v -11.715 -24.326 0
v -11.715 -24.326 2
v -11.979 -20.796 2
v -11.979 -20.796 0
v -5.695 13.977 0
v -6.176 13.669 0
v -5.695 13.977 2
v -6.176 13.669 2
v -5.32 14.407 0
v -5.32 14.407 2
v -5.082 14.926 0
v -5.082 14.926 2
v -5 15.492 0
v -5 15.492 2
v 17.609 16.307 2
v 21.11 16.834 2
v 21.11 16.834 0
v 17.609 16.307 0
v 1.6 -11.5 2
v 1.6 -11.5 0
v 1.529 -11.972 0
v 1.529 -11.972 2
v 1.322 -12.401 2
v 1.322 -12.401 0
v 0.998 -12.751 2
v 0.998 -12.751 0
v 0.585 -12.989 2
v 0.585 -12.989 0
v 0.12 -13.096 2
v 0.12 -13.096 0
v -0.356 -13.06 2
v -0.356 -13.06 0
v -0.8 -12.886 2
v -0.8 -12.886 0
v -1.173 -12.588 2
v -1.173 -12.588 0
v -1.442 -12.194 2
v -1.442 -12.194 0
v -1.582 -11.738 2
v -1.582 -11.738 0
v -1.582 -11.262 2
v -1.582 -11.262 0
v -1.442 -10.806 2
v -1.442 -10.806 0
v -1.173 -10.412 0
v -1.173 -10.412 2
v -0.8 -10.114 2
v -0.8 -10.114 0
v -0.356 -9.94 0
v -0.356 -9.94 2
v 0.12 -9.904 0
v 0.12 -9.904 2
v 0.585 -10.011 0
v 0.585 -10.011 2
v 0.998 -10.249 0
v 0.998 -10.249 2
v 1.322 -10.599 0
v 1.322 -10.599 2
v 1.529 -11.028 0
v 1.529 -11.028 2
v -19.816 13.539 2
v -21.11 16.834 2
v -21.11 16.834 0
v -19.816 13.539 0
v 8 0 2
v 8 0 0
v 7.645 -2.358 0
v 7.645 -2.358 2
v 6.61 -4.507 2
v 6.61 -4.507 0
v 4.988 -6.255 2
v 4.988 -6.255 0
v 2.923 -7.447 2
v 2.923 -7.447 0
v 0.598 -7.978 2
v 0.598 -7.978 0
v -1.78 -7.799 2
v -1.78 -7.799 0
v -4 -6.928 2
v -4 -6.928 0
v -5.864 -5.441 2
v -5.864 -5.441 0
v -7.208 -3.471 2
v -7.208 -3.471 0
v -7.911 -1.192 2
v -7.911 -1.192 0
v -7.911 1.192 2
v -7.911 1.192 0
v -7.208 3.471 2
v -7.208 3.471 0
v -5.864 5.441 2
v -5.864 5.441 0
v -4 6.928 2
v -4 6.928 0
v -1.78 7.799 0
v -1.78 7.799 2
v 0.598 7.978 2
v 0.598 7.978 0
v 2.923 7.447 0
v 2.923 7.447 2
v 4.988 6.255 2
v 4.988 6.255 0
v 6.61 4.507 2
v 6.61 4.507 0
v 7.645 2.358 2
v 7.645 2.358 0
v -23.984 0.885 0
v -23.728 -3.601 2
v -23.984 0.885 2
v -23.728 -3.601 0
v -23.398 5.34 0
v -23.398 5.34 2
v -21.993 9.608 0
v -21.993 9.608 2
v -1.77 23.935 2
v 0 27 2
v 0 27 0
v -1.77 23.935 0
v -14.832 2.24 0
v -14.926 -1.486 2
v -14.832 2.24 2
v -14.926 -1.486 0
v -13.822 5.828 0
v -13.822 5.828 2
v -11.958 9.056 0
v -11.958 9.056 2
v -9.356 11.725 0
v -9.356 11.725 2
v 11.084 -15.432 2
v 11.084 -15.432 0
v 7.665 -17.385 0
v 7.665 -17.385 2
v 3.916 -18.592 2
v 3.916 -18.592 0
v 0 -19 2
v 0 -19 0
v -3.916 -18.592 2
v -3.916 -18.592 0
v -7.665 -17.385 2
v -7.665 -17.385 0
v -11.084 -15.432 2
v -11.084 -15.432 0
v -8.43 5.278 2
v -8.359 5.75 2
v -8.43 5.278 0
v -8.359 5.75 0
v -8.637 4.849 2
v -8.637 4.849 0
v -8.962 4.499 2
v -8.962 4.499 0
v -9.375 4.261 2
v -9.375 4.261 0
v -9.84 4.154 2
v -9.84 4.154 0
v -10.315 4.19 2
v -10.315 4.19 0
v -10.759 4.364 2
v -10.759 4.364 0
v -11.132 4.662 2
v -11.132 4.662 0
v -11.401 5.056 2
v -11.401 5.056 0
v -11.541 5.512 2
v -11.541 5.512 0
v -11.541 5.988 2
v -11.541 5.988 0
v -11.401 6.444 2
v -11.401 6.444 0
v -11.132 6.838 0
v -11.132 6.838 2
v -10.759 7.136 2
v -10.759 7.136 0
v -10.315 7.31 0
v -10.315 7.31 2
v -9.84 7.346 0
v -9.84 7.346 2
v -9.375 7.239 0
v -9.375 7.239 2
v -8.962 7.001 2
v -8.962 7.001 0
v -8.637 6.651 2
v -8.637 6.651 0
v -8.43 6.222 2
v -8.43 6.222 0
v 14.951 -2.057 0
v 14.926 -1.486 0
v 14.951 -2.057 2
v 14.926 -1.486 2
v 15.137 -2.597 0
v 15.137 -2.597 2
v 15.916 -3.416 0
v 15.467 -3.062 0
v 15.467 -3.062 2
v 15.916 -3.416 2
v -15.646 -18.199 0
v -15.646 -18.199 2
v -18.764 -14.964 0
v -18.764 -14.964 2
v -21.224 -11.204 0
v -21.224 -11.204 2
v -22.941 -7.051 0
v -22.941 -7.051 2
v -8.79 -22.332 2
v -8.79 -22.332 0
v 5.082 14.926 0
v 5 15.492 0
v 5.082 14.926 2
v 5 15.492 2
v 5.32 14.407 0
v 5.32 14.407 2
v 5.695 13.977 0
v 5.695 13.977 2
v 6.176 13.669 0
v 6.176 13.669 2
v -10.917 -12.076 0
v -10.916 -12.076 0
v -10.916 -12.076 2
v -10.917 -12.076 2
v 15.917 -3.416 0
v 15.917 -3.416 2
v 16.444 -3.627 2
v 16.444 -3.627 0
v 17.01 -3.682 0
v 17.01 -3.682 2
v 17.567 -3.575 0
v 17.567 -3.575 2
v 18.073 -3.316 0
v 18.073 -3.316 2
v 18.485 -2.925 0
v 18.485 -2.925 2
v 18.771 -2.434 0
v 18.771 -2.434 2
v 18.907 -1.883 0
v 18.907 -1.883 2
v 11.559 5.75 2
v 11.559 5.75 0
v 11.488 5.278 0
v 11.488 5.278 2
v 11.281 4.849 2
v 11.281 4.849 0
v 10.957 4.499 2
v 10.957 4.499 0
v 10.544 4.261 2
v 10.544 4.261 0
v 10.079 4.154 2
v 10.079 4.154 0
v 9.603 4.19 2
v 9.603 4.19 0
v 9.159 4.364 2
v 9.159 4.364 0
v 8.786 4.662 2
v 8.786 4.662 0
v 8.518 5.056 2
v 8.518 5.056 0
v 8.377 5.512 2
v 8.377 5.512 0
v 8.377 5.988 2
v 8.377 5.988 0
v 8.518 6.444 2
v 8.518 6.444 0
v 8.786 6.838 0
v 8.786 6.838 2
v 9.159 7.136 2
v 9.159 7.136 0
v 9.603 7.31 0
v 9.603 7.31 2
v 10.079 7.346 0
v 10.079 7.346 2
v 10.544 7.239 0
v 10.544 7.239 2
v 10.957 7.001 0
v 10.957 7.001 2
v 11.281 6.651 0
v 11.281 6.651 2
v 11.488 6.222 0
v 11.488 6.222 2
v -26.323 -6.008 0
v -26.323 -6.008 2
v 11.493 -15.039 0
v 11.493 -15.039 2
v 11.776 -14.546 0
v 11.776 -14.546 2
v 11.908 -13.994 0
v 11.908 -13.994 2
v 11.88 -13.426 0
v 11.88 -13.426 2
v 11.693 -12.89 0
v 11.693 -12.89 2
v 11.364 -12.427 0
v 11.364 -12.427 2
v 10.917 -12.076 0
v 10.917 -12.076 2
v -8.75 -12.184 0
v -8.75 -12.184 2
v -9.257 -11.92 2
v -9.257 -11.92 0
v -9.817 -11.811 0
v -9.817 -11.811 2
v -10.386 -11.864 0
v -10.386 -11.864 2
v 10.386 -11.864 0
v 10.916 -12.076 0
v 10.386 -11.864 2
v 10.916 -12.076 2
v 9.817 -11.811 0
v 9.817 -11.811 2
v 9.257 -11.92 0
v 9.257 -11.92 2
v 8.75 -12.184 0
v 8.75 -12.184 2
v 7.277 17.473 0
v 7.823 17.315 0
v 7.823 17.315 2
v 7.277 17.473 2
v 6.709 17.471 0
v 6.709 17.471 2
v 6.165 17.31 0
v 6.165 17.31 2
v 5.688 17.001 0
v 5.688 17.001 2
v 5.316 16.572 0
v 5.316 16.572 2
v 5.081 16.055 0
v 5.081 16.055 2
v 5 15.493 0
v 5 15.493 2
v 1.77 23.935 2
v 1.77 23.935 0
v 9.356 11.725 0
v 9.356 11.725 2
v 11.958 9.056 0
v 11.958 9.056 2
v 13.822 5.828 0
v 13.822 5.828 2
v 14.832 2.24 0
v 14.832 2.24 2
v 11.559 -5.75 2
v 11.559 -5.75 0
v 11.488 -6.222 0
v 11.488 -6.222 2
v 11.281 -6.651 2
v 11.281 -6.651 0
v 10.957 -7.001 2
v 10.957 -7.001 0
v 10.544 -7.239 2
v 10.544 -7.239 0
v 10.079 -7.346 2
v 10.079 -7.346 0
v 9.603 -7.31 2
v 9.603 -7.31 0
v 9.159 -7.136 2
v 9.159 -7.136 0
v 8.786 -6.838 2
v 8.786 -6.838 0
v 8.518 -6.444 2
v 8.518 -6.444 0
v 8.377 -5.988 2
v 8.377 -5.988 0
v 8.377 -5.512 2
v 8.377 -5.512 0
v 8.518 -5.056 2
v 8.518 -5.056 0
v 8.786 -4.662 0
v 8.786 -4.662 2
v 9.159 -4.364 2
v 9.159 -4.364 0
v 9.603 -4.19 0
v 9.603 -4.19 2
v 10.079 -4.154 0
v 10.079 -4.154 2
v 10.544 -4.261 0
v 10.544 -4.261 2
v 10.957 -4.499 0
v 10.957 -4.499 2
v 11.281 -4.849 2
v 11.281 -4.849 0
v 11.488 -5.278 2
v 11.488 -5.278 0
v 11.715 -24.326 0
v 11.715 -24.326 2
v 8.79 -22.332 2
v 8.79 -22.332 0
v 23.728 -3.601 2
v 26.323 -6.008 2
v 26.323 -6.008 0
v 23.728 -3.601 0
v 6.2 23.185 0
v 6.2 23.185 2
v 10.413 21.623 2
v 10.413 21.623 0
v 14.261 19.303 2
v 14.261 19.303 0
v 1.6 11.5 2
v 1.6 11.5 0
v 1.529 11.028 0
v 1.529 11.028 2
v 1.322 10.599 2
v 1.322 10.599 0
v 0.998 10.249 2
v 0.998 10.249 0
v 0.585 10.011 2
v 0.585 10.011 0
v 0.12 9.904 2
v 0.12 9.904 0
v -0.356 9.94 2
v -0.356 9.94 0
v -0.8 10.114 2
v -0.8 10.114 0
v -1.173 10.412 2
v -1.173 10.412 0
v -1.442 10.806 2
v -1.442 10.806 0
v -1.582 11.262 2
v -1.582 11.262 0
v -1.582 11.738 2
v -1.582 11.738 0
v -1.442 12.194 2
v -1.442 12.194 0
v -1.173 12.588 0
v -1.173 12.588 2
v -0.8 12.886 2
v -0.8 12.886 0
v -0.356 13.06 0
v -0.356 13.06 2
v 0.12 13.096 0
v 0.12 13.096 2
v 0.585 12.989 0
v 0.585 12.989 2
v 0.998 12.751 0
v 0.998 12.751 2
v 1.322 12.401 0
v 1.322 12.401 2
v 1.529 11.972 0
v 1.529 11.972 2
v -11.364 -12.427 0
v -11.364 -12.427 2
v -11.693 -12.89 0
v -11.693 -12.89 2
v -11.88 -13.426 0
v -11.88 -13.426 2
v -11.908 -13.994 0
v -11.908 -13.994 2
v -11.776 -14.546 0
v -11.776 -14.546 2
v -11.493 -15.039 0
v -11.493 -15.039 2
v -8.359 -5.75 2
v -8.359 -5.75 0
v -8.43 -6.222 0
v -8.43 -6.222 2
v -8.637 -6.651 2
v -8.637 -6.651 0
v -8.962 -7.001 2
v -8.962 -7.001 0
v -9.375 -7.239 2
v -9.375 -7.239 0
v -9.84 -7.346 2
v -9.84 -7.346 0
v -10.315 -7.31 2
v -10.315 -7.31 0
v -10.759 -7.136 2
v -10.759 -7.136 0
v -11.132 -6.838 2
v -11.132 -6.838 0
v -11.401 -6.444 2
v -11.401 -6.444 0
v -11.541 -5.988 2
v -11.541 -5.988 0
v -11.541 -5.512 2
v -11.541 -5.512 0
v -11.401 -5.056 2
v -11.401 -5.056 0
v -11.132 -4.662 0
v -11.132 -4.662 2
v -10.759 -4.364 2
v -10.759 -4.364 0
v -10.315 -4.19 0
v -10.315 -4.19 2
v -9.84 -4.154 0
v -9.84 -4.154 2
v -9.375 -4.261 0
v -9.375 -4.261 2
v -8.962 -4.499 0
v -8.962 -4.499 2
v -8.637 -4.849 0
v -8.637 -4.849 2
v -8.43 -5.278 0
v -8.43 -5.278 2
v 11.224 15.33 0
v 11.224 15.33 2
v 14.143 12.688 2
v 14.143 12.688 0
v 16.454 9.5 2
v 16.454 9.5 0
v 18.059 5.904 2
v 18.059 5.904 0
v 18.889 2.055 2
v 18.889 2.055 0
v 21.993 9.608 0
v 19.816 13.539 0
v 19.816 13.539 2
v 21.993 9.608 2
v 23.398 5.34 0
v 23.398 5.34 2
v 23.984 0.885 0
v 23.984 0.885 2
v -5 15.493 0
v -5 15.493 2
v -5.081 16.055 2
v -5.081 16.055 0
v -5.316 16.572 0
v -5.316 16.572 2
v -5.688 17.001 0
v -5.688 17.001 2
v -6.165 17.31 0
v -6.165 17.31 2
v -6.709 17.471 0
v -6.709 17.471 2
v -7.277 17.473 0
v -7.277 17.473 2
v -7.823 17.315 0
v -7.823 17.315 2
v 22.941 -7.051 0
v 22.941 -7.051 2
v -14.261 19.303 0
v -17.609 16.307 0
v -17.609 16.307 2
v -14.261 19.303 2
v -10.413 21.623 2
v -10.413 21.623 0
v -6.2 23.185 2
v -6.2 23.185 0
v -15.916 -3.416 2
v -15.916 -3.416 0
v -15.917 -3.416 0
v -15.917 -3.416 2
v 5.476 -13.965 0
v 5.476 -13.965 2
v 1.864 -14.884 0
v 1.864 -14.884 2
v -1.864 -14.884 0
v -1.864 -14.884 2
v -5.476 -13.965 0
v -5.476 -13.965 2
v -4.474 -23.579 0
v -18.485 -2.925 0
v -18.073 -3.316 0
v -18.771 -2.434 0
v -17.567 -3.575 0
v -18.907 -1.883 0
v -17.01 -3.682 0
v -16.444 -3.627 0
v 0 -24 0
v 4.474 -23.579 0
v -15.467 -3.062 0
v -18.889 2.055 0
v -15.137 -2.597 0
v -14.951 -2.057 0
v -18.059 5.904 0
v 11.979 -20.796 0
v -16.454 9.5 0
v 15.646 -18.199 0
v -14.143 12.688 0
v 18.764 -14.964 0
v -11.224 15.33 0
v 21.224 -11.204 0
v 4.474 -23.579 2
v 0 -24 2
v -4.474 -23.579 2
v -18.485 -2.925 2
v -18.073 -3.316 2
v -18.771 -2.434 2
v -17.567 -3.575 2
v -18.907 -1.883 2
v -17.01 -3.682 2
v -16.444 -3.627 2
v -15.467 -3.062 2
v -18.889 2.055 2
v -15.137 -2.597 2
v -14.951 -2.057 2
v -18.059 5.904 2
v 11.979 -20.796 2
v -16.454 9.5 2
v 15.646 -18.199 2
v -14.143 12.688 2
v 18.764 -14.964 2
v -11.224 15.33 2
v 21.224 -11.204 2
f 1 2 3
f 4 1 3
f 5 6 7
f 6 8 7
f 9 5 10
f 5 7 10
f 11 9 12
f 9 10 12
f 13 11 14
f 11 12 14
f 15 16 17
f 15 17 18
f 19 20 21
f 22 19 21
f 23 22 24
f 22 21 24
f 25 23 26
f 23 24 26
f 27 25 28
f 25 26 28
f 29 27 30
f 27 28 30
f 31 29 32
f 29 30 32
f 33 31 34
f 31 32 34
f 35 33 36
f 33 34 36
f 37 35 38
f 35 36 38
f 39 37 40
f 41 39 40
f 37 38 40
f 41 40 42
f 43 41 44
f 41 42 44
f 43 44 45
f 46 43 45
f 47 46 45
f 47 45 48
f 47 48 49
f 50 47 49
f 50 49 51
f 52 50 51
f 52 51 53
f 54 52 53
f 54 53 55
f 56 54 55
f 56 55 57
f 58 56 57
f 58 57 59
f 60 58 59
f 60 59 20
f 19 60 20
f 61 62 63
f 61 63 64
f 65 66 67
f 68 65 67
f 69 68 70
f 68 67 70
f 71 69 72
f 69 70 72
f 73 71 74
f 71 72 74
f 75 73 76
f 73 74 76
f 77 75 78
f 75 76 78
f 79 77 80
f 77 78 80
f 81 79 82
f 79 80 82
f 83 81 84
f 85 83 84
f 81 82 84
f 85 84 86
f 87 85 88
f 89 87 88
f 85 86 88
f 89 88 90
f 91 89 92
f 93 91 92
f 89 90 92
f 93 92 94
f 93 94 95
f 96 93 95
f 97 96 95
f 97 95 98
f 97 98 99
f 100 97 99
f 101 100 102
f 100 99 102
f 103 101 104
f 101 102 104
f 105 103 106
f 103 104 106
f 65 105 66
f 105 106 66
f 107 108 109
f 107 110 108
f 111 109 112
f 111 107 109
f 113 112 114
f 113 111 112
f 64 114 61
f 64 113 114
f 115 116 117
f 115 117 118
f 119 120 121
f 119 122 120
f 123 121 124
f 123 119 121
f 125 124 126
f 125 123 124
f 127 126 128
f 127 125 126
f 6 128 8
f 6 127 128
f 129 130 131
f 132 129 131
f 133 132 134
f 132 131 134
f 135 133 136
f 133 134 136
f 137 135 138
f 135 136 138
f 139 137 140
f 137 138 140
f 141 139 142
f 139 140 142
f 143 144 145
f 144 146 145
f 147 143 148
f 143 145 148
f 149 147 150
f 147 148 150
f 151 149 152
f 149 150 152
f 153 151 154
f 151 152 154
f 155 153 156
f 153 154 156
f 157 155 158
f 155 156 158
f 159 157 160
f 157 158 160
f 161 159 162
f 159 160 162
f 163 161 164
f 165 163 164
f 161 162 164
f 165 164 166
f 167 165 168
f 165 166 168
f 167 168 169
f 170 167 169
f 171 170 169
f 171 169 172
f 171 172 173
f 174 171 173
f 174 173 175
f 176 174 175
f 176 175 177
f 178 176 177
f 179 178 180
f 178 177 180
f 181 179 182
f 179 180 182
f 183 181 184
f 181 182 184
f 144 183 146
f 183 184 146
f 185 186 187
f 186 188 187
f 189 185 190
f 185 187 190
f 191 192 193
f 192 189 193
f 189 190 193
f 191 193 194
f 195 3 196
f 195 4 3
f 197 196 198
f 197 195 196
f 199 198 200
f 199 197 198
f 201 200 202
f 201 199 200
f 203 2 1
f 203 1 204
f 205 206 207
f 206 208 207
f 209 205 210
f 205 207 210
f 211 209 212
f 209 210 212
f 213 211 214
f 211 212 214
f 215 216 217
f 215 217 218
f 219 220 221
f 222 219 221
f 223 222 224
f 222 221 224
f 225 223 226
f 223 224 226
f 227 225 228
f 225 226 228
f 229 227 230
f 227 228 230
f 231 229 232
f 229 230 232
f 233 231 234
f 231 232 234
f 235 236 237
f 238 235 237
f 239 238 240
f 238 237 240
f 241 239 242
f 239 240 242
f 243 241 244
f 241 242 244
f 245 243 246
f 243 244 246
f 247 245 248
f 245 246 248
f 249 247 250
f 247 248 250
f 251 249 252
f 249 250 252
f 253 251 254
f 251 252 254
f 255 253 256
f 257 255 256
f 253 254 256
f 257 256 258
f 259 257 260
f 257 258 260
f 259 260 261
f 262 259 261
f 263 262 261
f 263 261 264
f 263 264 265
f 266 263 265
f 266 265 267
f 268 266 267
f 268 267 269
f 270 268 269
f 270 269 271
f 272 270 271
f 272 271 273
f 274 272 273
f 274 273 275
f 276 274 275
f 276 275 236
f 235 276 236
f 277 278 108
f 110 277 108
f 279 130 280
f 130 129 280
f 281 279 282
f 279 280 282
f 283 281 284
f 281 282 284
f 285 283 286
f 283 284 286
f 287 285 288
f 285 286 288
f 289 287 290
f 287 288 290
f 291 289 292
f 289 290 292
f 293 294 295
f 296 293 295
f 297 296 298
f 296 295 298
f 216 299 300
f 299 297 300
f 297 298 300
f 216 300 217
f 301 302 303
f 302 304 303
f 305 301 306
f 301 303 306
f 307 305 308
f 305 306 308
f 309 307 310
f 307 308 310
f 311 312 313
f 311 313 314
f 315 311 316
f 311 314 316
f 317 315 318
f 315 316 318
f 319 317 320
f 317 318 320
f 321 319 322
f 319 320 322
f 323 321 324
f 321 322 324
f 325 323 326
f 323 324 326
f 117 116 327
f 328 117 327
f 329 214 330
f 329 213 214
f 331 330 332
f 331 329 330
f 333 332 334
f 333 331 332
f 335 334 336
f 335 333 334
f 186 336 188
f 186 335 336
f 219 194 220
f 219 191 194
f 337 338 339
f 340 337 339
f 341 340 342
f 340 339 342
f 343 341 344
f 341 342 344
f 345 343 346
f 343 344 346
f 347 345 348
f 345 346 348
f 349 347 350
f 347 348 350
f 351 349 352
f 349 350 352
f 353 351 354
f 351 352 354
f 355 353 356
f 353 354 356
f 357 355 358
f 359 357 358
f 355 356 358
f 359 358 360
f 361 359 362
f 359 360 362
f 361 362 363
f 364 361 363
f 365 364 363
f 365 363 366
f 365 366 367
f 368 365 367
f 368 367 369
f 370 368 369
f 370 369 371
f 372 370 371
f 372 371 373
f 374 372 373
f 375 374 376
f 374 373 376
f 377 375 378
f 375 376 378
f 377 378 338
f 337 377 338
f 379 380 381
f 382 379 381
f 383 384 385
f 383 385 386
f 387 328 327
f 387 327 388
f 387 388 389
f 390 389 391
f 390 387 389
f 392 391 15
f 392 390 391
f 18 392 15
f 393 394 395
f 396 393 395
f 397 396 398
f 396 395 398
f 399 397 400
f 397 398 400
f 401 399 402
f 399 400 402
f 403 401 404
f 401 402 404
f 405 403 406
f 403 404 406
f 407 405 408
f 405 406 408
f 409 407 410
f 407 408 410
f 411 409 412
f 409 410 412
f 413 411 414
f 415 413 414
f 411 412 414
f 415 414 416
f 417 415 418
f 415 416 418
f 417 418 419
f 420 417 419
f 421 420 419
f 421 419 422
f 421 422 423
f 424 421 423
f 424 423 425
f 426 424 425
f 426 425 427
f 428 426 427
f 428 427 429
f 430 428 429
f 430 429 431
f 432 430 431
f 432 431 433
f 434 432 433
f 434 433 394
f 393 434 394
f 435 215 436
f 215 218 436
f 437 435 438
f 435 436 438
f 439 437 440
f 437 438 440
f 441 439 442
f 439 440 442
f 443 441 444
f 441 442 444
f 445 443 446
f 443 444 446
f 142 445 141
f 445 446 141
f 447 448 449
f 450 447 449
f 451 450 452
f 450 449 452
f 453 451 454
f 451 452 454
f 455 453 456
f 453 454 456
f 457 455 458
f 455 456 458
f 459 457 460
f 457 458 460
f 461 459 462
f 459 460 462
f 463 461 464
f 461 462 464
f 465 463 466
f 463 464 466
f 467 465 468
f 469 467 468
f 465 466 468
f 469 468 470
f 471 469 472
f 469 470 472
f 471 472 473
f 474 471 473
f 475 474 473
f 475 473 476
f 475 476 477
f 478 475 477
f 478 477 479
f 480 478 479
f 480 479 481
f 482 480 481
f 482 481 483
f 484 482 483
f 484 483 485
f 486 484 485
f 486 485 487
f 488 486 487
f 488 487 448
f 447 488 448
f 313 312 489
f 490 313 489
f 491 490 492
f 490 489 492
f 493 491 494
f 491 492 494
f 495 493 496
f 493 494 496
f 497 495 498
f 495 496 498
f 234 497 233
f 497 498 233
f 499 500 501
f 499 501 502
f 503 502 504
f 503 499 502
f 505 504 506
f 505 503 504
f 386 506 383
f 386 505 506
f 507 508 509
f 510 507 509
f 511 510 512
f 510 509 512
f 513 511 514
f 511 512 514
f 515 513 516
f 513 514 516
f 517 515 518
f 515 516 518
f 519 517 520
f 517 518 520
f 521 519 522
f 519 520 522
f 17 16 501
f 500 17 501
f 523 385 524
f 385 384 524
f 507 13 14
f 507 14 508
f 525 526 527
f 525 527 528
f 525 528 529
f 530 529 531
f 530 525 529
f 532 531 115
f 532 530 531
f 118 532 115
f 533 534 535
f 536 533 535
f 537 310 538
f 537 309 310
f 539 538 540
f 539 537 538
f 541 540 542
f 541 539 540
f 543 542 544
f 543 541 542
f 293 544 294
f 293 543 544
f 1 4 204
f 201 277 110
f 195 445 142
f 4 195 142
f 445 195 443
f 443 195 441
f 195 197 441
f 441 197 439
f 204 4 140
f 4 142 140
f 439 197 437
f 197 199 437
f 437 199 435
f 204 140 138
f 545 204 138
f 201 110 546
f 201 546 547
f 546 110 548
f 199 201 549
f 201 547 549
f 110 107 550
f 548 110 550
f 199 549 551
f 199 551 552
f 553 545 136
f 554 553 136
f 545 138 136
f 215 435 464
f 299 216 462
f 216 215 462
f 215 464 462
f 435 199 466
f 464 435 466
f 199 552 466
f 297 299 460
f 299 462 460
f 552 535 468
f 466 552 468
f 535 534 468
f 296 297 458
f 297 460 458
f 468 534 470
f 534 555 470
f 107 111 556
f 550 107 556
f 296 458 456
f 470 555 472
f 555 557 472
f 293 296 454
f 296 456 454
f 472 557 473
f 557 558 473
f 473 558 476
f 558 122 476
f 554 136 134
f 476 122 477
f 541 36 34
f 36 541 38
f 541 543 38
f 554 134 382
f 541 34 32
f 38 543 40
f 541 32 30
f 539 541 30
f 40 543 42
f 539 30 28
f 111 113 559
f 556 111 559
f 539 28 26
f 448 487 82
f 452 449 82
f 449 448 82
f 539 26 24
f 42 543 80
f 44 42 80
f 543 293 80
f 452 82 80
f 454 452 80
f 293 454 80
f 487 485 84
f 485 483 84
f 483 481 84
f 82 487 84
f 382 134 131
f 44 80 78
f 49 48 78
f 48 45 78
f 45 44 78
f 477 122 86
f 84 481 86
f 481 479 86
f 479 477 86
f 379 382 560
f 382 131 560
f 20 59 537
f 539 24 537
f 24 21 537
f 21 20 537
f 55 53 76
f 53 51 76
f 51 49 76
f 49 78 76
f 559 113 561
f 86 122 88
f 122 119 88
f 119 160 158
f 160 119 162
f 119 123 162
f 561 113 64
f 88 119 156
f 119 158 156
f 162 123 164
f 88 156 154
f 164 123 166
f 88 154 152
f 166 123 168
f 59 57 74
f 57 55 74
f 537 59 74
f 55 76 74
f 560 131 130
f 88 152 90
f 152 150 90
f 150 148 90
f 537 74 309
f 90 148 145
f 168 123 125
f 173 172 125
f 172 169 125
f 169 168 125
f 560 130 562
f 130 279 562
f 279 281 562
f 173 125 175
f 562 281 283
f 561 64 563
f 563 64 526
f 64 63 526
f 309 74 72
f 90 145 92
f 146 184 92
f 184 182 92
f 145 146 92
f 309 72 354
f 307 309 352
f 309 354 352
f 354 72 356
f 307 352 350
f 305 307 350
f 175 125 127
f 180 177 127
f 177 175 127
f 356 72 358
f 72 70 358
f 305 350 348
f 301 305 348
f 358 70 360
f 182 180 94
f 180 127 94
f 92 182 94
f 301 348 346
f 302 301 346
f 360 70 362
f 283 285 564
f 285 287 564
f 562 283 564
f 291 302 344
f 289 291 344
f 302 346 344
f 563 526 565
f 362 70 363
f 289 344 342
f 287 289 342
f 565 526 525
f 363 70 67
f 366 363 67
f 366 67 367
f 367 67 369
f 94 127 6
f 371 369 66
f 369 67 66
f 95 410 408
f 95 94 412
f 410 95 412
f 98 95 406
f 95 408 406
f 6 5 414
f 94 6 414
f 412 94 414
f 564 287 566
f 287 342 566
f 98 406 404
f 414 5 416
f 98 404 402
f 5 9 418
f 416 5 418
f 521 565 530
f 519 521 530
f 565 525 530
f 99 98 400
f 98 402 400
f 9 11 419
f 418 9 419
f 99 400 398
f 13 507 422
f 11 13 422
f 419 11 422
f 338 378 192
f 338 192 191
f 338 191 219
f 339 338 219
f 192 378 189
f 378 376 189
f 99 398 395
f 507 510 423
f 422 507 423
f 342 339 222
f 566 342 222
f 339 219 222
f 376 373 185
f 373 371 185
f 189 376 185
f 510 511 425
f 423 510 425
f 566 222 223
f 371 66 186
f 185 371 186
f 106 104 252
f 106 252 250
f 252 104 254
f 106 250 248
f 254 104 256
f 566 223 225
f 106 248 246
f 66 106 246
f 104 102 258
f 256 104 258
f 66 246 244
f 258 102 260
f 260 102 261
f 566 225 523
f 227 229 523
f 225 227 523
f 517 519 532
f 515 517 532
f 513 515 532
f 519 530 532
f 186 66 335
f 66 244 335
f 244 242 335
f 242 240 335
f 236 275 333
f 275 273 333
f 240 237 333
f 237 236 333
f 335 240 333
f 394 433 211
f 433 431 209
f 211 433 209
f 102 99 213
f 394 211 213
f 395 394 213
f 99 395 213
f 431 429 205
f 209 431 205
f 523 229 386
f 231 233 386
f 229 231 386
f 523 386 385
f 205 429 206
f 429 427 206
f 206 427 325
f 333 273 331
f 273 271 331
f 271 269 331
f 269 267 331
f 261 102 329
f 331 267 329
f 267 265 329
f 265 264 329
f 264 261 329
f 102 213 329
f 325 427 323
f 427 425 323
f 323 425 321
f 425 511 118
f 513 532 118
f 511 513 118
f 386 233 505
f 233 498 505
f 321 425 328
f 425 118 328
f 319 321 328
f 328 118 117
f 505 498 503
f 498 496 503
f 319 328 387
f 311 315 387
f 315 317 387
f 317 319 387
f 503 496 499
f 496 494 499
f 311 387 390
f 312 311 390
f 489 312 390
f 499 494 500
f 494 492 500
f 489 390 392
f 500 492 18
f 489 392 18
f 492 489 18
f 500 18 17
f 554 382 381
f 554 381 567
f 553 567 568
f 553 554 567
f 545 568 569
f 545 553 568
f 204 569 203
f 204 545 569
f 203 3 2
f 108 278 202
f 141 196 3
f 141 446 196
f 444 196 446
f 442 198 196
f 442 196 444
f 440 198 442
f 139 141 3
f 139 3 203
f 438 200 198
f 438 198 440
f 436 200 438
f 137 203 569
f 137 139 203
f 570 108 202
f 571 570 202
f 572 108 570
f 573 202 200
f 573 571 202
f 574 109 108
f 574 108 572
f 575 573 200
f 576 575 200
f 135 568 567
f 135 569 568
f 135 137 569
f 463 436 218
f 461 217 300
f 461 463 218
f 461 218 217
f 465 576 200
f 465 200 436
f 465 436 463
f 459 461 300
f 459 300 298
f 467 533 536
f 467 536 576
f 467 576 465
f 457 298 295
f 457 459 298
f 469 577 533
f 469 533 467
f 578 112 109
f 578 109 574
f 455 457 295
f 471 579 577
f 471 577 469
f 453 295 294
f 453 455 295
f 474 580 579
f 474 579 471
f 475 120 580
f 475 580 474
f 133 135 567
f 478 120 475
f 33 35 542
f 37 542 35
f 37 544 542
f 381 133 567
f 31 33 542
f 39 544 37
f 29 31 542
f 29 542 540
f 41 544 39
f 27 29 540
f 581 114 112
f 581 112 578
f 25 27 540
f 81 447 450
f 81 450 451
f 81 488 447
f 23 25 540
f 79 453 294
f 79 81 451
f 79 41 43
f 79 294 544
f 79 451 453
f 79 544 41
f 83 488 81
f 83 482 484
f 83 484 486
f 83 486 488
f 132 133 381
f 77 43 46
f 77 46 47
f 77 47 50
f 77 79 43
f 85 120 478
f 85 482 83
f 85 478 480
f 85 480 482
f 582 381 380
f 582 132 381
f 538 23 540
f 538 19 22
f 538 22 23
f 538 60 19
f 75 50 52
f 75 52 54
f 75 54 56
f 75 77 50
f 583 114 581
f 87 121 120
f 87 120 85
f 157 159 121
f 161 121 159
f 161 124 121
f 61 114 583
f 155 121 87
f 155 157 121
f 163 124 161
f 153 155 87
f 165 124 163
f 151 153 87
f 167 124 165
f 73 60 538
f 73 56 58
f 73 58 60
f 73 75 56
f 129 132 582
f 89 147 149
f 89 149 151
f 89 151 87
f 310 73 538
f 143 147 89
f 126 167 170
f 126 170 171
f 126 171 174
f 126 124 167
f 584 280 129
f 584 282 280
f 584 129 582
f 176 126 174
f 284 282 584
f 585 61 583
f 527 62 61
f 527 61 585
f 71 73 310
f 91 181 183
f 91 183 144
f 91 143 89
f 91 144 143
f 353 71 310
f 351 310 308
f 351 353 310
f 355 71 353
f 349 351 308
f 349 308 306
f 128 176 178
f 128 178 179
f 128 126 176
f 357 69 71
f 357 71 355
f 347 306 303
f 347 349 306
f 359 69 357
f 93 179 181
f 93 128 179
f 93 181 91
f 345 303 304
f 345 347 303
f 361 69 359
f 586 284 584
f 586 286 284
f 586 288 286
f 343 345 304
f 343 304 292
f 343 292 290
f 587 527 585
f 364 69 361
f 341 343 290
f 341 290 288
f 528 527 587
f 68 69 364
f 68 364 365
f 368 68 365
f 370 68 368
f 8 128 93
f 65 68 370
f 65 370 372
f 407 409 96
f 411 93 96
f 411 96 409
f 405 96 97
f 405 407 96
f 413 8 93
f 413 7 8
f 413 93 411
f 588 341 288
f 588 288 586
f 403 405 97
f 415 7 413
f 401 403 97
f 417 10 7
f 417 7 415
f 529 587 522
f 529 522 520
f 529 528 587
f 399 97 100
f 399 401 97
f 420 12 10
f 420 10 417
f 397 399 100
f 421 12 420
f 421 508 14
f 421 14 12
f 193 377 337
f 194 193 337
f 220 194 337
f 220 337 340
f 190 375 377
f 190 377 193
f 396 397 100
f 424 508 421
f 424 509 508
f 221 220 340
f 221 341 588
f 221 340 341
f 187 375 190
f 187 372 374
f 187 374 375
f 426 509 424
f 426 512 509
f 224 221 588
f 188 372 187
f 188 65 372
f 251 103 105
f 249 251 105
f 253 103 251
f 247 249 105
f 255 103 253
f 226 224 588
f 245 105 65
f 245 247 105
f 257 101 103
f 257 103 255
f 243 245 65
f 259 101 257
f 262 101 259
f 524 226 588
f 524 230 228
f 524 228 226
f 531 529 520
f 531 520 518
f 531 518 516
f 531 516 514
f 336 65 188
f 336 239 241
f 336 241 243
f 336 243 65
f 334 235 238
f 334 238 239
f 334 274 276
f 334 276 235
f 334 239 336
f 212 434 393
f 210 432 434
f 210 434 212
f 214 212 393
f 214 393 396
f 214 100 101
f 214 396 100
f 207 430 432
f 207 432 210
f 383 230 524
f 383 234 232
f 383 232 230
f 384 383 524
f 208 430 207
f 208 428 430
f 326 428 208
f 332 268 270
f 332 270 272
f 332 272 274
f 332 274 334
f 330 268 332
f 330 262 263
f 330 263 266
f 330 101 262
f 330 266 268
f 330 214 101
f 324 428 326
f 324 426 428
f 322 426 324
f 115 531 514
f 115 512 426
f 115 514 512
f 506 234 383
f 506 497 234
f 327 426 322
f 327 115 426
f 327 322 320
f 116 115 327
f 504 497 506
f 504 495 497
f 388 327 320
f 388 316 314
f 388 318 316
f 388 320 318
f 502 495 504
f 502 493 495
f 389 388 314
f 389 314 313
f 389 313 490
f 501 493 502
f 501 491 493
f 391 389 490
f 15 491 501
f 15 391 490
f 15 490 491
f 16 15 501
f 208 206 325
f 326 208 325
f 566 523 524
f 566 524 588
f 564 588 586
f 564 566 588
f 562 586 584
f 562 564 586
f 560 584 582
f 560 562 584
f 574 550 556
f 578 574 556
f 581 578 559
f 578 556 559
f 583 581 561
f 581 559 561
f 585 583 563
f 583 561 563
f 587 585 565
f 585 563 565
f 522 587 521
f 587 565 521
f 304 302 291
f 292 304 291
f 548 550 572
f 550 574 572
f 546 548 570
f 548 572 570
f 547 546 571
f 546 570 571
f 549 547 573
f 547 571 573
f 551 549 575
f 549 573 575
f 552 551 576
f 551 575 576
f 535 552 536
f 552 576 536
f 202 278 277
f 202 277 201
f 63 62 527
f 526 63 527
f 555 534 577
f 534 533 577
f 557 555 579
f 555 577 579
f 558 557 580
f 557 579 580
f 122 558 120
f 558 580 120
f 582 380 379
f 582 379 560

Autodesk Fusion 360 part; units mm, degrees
sketch "Sketch1" plane through (0, 0, 0) normal (0, 0, 1) x (1, 0, 0)
  circle A0 centre (0, 0) radius 24
  circle A1 centre (0, 0) radius 11.5
  line L0 (0, 0) -> (0, 11.5)
  line L1 (0, 0) -> (-9.9593, 5.75)
  line L2 (0, 0) -> (9.9593, 5.75)
  line L3 (0, 0) -> (9.9593, -5.75)
  line L4 (0, 0) -> (0, -11.5)
  line L5 (0, 0) -> (-9.9593, -5.75)
  circle A2 centre (0, 11.5) radius 1.6
  circle A3 centre (9.9593, 5.75) radius 1.6
  circle A4 centre (9.9593, -5.75) radius 1.6
  circle A5 centre (0, -11.5) radius 1.6
  circle A6 centre (-9.9593, -5.75) radius 1.6
  circle A7 centre (-9.9593, 5.75) radius 1.6
  line L6 (0, 11.5) -> (-5, 11.5)
  line L7 (0, 11.5) -> (5, 11.5)
  line L8 (9.9593, -5.75) -> (7.4593, -10.0801)
  line L9 (9.9593, -5.75) -> (12.4593, -1.4199)
  line L10 (-9.9593, -5.75) -> (-7.4593, -10.0801)
  line L11 (-9.9593, -5.75) -> (-12.4593, -1.4199)
  circle A8 centre (0, 0) radius 19
  line L12 (-5, 11.5) -> (-5, 10.3562)
  line L13 (5, 11.5) -> (5, 10.3562)
  line L14 (12.4593, -1.4199) -> (11.4687, -0.848)
  line L15 (7.4593, -10.0801) -> (6.4687, -9.5082)
  line L16 (-7.4593, -10.0801) -> (-6.4687, -9.5082)
  line L17 (-12.4593, -1.4199) -> (-11.4687, -0.848)
  line L18 (-12.4593, -1.4199) -> (-18.3745, -4.835)
  line L19 (-7.4593, -10.0801) -> (-13.3745, -13.4953)
  line L20 (7.4593, -10.0801) -> (13.3745, -13.4953)
  line L21 (12.4593, -1.4199) -> (18.3745, -4.835)
  line L22 (5, 11.5) -> (5, 18.3303)
  line L23 (-5, 11.5) -> (-5, 18.3303)
  circle A9 centre (0, 0) radius 8
  circle A10 centre (0, 0) radius 15
  line L24 (0, 24) -> (-15.4269, 18.3851)
  line L25 (-15.4269, 18.3851) -> (-23.6354, 4.1676)
  line L26 (-23.6354, 4.1676) -> (-20.7846, -12)
  line L27 (-20.7846, -12) -> (-8.2085, -22.5526)
  line L28 (-8.2085, -22.5526) -> (8.2085, -22.5526)
  line L29 (8.2085, -22.5526) -> (20.7846, -12)
  line L30 (20.7846, -12) -> (23.6354, 4.1676)
  line L31 (23.6354, 4.1676) -> (15.4269, 18.3851)
  line L32 (15.4269, 18.3851) -> (0, 24)
  line L33 (0, 24) -> (0.2615, 26.9886)
  line L34 (0, 24) -> (3, 24) construction
  line L35 (0.2615, 26.9886) -> (-1.883, 23.926)
  line L36 (0.2615, 26.9886) -> (4.0002, 26.9886) construction
  dimension "d1" = 48
  dimension "d2" = 23
  dimension "d3" = 3.2
  dimension "d4" = 3.2
  dimension "d5" = 3.2
  dimension "d6" = 3.2
  dimension "d7" = 3.2
  dimension "d8" = 3.2
  dimension "d9" = 5
  dimension "d10" = 5
  dimension "d11" = 5
  dimension "d12" = 5
  dimension "d13" = 5
  dimension "d14" = 38
  dimension "d15" = 16
  dimension "d16" = 30
  dimension "d17" = 85
  dimension "d18" = 3
  dimension "d19" = 125
extrude "Extrude1" add sketch "Sketch1" along normal blind 2 contours A0 L30 | A0 L31 | L24 L25 L26 L27 L28 L29 L30 L31 L32 | A0 L29 | A0 L32 | A0 L28 | A0 L24 | A0 L27 | A0 L25 | A0 L26 | A1 L2 L3 A3 A4 A9 | A1 A4 L9 L14 | A1 A3 L13 L14 L21 L22 A10 | A4 L8 L9 L20 L21 A10 | A1 L3 L4 A4 A5 A9 | A8 L20 L21 A10 | A1 L0 L2 A2 A3 A9 | A1 A4 L8 L15 | A1 A5 L15 L16 L19 L20 A10 | A1 L4 L5 A5 A6 A9 | A6 L10 L11 L18 L19 A10 | A8 L18 L19 A10 | A8 L22 L23 A10 | A2 L6 L7 L22 L23 A10 | A1 A2 L7 L13 | A1 L0 L1 A2 A7 A9 | A1 L1 L5 A6 A7 A9 | A1 A6 L10 L16 | A1 A7 L12 L17 L18 L23 A10 | A1 A6 L11 L17 | A1 A2 L6 L12
fillet "Fillet1" radius 2 12 edges at (5, 18.3303, 1) (5, 14.1421, 1) (14.7474, -2.7409, 1) (18.3745, -4.835, 1) (13.3745, -13.4953, 1) (9.7474, -11.4012, 1) (-9.7474, -11.4012, 1) (-13.3745, -13.4953, 1) (-18.3745, -4.835, 1) (-14.7474, -2.7409, 1) (-5, 14.1421, 1) (-5, 18.3303, 1)
sketch "Sketch2" plane through (0, 0, 2) normal (0, 0, 1) x (-1, 0, 0)
  circle A0 centre (9.9593, 5.75) radius 1.6
  circle A1 centre (0, 0) radius 8
  circle A2 centre (0, -11.5) radius 1.6
  arc A3 (8.7498, 12.1837) -> (11.083, 15.4326) centre (9.9164, 13.8081) ccw
  arc A4 (8.7498, 12.1837) -> (-8.7498, 12.1837) centre (0, 0) ccw
  arc A5 (-11.083, 15.4326) -> (-8.7498, 12.1837) centre (-9.9164, 13.8081) ccw
  arc A6 (11.083, 15.4326) -> (-11.083, 15.4326) centre (0, 0) ccw
  circle A7 centre (9.9593, -5.75) radius 1.6
  arc A8 (6.1765, -13.6694) -> (7.8235, -17.3145) centre (7, -15.4919) ccw
  arc A9 (6.1765, -13.6694) -> (14.9262, 1.4857) centre (0, 0) ccw
  arc A10 (18.9066, 1.8819) -> (14.9262, 1.4857) centre (16.9164, 1.6838) ccw
  arc A11 (7.8235, -17.3145) -> (18.9066, 1.8819) centre (0, 0) ccw
  arc A12 (-18.9066, 1.8819) -> (-7.8235, -17.3145) centre (0, 0) ccw
  arc A13 (-14.9262, 1.4857) -> (-18.9066, 1.8819) centre (-16.9164, 1.6838) ccw
  arc A14 (-14.9262, 1.4857) -> (-6.1765, -13.6694) centre (0, 0) ccw
  arc A15 (-7.8235, -17.3145) -> (-6.1765, -13.6694) centre (-7, -15.4919) ccw
  circle A16 centre (-9.9593, -5.75) radius 1.6
  circle A17 centre (0, 11.5) radius 1.6
  circle A18 centre (-9.9593, 5.75) radius 1.6
  circle A19 centre (0, 0) radius 24
  line L0 (0, -8) -> (0, -13.1)
  line L1 (0, -24) -> (3.0935, -24) construction
  line L2 (0, -24) -> (0, -27)
  line L3 (0, -24) -> (3.0102, -24) construction
  line L4 (0, -27) -> (1.7698, -23.9347)
  line L5 (0, -27) -> (-1.7698, -23.9347)
  arc A20 (0, -27) -> (0, -27) centre (0, 0) ccw
  arc A21 (-1.7698, -23.9347) -> (1.7698, -23.9347) centre (0, 0) ccw
  line L6 (21.1095, -16.8342) -> (19.8163, -13.5393)
  line L7 (21.1095, -16.8342) -> (17.6094, -16.3067)
  arc A22 (17.6094, -16.3067) -> (19.8163, -13.5393) centre (0, 0) ccw
  line L8 (26.3231, 6.0081) -> (22.9408, 7.0514)
  line L9 (26.3231, 6.0081) -> (23.7284, 3.6006)
  arc A23 (23.7284, 3.6006) -> (22.9408, 7.0514) centre (0, 0) ccw
  line L10 (11.7149, 24.3262) -> (8.7903, 22.3323)
  line L11 (11.7149, 24.3262) -> (11.9794, 20.7965)
  arc A24 (11.9794, 20.7965) -> (8.7903, 22.3323) centre (0, 0) ccw
  line L12 (-11.7149, 24.3262) -> (-11.9794, 20.7965)
  line L13 (-11.7149, 24.3262) -> (-8.7903, 22.3323)
  arc A25 (-8.7903, 22.3323) -> (-11.9794, 20.7965) centre (0, 0) ccw
  line L14 (-26.3231, 6.0081) -> (-23.7284, 3.6006)
  line L15 (-26.3231, 6.0081) -> (-22.9408, 7.0514)
  arc A26 (-22.9408, 7.0514) -> (-23.7284, 3.6006) centre (0, 0) ccw
  line L16 (-21.1095, -16.8342) -> (-17.6094, -16.3067)
  line L17 (-21.1095, -16.8342) -> (-19.8163, -13.5393)
  arc A27 (-19.8163, -13.5393) -> (-17.6094, -16.3067) centre (0, 0) ccw
  dimension "d24" = 54
  dimension "d30" = 30
  dimension "d46" = 360
extrude "Extrude5" add sketch "Sketch2" against normal blind 2 contours A19 L8 L9 A23 | A19 L6 L7 A22 | A19 L10 L11 A24 | A19 L2 L4 A21 | A19 L2 L5 A21 | A19 L12 L13 A25 | A19 L16 L17 A27 | A19 L14 L15 A26
